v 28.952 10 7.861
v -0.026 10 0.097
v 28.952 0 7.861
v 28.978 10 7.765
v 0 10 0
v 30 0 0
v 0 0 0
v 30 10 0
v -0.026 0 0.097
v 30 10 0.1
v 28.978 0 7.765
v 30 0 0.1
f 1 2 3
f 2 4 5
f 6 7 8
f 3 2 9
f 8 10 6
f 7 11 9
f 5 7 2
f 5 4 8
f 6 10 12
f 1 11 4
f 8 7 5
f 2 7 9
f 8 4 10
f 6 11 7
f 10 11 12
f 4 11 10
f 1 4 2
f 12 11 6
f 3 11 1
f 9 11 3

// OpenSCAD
Length = 30; // [1:50]

Width = 10; // [1:50] 

// ignore this variable!
Height = 0.1 * 1;

// Steepness?
Angle = 15; // [1:20]

module shim() {
hull() {
	translate([0, 0, 0])
	rotate([0, -Angle, 0])
	cube([Length, Width, Height]);
	cube([Length, Width, Height]);
	}
}

shim();
